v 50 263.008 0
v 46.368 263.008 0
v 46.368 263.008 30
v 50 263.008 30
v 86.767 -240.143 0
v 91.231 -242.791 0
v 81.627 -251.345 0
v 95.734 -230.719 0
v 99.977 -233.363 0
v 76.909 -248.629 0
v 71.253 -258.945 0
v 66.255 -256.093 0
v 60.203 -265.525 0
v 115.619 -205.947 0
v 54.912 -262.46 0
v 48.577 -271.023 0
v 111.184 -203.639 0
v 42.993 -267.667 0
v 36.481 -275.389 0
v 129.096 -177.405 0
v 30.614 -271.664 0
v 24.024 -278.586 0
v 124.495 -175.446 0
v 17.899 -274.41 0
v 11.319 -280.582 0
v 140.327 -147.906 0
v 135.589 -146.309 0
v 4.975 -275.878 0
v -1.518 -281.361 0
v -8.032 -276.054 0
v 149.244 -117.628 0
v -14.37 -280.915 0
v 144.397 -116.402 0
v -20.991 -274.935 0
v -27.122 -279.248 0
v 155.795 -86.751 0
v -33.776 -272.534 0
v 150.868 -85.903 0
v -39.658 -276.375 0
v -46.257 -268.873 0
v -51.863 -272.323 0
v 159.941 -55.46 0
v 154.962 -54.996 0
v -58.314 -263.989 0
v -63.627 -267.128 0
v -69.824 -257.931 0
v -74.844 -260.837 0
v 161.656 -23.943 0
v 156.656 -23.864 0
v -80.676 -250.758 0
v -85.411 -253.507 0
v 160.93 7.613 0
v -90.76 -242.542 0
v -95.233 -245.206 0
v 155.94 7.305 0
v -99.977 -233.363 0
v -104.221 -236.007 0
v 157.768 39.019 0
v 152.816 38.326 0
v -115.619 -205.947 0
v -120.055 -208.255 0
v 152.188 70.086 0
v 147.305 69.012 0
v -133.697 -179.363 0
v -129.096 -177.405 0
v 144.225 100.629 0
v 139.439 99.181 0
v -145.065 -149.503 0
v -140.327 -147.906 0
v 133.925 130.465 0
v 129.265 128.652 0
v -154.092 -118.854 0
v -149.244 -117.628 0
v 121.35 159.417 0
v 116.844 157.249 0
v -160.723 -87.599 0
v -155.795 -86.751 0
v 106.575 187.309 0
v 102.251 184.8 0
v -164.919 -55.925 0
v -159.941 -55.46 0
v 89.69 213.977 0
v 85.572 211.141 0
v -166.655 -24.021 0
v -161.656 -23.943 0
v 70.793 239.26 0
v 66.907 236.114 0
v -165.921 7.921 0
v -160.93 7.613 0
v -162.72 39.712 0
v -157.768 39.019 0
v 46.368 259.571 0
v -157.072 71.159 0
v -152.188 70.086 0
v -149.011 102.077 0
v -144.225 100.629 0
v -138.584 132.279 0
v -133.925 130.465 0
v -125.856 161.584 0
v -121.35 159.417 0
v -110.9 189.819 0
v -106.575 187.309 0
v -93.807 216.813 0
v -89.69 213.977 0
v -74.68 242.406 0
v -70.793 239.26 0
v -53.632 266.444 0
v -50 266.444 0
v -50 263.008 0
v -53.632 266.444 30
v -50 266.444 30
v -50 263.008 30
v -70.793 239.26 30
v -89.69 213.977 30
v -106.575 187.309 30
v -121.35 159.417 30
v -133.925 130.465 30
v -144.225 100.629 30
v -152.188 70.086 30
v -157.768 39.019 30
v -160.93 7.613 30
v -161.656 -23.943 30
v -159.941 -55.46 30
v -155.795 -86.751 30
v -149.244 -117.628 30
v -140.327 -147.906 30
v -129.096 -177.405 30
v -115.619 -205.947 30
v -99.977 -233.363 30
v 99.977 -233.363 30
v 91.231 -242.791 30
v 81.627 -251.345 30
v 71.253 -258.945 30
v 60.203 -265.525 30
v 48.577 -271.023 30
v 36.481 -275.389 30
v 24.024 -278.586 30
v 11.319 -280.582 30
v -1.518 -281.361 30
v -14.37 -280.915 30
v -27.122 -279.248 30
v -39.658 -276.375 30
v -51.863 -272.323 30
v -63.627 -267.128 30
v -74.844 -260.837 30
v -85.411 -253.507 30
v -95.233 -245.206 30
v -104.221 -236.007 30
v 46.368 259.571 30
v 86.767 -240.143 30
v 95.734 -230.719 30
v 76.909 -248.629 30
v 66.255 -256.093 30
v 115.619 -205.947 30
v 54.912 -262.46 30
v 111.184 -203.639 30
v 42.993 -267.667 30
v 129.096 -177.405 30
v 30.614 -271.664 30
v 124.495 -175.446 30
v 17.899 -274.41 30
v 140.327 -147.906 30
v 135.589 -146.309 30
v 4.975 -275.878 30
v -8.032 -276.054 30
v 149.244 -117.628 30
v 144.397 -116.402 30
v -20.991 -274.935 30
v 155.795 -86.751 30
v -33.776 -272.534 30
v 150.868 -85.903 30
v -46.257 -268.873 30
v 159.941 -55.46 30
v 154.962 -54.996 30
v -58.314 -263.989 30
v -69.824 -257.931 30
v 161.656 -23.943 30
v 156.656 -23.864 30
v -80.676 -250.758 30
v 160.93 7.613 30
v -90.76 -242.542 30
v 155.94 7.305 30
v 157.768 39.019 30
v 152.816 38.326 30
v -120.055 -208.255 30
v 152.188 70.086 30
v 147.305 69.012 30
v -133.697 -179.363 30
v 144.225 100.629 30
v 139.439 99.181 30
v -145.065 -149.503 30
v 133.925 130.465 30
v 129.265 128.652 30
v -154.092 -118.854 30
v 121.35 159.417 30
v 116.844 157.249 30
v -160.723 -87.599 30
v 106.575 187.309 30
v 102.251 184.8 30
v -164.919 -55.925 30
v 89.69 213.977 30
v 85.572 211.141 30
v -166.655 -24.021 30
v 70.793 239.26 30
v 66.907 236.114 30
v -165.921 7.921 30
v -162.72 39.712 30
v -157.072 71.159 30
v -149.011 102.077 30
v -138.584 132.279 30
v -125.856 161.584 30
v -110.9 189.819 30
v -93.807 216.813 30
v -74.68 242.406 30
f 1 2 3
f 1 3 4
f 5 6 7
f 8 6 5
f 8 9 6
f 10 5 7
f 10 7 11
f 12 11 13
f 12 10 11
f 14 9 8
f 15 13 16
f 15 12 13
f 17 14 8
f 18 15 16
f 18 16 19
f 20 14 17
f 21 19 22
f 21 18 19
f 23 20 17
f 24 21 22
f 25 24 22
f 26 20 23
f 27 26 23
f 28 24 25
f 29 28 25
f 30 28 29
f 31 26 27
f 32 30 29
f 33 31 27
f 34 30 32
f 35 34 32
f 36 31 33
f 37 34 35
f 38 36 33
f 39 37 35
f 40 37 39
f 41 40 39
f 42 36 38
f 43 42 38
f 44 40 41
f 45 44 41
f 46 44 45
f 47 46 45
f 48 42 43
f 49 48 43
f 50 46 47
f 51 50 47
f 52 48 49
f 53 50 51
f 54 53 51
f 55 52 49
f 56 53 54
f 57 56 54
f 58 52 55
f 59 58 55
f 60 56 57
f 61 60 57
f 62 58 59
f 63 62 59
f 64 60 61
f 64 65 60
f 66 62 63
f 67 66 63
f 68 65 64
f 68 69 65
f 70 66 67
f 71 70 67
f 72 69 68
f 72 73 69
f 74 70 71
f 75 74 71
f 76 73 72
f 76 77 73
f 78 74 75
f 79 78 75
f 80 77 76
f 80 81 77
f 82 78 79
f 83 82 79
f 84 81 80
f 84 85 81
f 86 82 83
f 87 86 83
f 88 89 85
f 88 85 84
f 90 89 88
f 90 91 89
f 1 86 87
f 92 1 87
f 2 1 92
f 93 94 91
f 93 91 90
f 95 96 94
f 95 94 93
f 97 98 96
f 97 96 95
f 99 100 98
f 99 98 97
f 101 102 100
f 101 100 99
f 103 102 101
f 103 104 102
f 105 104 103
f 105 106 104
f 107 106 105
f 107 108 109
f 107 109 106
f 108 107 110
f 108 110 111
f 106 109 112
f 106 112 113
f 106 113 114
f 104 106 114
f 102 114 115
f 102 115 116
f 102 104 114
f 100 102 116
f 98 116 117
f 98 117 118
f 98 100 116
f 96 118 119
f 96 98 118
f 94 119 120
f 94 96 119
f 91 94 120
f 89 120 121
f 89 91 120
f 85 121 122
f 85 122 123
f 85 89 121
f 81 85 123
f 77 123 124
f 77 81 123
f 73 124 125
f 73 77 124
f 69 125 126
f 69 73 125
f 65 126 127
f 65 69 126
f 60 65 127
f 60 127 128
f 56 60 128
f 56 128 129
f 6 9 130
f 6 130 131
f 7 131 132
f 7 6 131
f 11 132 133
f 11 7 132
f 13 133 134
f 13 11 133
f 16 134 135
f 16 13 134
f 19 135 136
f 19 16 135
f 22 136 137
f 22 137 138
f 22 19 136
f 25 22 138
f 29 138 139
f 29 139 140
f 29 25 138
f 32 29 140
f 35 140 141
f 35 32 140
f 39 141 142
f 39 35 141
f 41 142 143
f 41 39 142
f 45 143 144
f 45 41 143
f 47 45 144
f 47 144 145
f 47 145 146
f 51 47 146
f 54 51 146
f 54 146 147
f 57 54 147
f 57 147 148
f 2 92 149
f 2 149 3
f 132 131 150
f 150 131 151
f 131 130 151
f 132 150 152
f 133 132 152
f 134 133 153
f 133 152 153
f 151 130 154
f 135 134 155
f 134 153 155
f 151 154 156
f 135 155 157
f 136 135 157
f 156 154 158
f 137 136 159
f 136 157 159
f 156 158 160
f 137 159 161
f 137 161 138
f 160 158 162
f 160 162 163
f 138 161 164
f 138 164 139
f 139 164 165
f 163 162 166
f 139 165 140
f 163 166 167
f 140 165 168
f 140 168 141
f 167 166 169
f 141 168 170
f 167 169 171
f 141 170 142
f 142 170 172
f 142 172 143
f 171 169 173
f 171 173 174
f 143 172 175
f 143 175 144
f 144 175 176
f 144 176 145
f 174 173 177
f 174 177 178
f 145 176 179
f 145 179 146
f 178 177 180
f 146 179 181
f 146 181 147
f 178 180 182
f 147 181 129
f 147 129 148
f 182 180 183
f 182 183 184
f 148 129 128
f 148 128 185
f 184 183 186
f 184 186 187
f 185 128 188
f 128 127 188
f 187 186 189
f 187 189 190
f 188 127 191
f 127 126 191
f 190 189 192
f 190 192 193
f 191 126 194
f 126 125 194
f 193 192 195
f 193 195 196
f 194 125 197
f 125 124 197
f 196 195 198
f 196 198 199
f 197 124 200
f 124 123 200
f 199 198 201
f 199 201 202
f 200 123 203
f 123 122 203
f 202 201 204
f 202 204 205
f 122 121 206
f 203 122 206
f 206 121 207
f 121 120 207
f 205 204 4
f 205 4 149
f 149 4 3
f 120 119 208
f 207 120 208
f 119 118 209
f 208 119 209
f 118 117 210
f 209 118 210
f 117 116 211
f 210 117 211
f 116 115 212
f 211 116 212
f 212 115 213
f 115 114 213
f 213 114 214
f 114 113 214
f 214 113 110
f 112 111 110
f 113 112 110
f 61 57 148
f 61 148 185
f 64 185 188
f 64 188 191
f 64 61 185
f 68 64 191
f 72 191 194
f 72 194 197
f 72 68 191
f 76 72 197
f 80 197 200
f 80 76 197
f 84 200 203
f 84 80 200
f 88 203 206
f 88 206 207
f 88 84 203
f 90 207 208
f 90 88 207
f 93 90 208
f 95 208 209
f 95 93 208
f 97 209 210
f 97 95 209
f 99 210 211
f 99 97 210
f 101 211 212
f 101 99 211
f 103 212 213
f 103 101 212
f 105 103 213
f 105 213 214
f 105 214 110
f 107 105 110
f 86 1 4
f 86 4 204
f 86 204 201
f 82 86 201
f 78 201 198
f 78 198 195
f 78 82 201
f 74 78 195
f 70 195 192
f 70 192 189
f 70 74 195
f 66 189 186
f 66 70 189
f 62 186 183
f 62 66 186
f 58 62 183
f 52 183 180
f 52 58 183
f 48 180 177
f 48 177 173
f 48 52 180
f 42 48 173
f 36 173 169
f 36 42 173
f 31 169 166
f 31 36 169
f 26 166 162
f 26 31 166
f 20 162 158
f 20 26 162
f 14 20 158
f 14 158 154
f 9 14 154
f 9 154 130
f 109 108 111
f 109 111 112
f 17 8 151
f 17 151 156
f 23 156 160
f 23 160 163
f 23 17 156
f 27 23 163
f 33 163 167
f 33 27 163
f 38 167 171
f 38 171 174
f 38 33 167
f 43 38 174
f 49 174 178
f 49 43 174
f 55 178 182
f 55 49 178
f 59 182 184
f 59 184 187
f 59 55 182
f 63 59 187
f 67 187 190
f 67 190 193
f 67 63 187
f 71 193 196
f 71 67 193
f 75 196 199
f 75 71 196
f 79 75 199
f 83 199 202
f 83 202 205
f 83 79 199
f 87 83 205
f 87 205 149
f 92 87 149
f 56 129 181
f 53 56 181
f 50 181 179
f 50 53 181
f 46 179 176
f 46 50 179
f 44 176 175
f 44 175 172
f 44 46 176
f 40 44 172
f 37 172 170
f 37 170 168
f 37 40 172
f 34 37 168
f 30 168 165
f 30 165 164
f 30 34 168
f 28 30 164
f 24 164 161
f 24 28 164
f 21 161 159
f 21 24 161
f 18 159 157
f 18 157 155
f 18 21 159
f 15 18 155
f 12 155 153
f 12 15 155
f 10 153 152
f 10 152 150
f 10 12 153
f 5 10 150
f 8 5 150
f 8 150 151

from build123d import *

# Parameters (mm, degrees)
BOSS_EXTRU_1_DEPTH = 30


with BuildPart() as part:
    # Esquisse1 → Boss.-Extru.1 (new body)
    with BuildSketch(Plane.XY):
        with BuildLine():
            Line((46.368433326, 259.570837519), (46.368433326, 263.007656324))
            Line((46.368433326, 263.007656324), (50, 263.007656324))
            ThreePointArc((50, 263.007656324), (159.652687148, 23.346633699), (99.977310085, -233.363254962))
            ThreePointArc((99.977310085, -233.363254962), (-1.517561323, -281.361033685), (-104.221114809, -236.007138747))
            ThreePointArc((-104.221114809, -236.007138747), (-164.627534347, 23.847528243), (-53.631566674, 266.444475128))
            Line((-53.631566674, 266.444475128), (-50, 266.444475128))
            Line((-50, 266.444475128), (-50, 263.007656324))
            ThreePointArc((-50, 263.007656324), (-159.652687148, 23.346633699), (-99.977310085, -233.363254962))
            ThreePointArc((-99.977310085, -233.363254962), (-1.526330683, -276.127902533), (95.733505362, -230.719371177))
            ThreePointArc((95.733505362, -230.719371177), (154.677839949, 22.845739156), (46.368433326, 259.570837519))
        make_face()
    extrude(amount=BOSS_EXTRU_1_DEPTH)


solid = part.part
